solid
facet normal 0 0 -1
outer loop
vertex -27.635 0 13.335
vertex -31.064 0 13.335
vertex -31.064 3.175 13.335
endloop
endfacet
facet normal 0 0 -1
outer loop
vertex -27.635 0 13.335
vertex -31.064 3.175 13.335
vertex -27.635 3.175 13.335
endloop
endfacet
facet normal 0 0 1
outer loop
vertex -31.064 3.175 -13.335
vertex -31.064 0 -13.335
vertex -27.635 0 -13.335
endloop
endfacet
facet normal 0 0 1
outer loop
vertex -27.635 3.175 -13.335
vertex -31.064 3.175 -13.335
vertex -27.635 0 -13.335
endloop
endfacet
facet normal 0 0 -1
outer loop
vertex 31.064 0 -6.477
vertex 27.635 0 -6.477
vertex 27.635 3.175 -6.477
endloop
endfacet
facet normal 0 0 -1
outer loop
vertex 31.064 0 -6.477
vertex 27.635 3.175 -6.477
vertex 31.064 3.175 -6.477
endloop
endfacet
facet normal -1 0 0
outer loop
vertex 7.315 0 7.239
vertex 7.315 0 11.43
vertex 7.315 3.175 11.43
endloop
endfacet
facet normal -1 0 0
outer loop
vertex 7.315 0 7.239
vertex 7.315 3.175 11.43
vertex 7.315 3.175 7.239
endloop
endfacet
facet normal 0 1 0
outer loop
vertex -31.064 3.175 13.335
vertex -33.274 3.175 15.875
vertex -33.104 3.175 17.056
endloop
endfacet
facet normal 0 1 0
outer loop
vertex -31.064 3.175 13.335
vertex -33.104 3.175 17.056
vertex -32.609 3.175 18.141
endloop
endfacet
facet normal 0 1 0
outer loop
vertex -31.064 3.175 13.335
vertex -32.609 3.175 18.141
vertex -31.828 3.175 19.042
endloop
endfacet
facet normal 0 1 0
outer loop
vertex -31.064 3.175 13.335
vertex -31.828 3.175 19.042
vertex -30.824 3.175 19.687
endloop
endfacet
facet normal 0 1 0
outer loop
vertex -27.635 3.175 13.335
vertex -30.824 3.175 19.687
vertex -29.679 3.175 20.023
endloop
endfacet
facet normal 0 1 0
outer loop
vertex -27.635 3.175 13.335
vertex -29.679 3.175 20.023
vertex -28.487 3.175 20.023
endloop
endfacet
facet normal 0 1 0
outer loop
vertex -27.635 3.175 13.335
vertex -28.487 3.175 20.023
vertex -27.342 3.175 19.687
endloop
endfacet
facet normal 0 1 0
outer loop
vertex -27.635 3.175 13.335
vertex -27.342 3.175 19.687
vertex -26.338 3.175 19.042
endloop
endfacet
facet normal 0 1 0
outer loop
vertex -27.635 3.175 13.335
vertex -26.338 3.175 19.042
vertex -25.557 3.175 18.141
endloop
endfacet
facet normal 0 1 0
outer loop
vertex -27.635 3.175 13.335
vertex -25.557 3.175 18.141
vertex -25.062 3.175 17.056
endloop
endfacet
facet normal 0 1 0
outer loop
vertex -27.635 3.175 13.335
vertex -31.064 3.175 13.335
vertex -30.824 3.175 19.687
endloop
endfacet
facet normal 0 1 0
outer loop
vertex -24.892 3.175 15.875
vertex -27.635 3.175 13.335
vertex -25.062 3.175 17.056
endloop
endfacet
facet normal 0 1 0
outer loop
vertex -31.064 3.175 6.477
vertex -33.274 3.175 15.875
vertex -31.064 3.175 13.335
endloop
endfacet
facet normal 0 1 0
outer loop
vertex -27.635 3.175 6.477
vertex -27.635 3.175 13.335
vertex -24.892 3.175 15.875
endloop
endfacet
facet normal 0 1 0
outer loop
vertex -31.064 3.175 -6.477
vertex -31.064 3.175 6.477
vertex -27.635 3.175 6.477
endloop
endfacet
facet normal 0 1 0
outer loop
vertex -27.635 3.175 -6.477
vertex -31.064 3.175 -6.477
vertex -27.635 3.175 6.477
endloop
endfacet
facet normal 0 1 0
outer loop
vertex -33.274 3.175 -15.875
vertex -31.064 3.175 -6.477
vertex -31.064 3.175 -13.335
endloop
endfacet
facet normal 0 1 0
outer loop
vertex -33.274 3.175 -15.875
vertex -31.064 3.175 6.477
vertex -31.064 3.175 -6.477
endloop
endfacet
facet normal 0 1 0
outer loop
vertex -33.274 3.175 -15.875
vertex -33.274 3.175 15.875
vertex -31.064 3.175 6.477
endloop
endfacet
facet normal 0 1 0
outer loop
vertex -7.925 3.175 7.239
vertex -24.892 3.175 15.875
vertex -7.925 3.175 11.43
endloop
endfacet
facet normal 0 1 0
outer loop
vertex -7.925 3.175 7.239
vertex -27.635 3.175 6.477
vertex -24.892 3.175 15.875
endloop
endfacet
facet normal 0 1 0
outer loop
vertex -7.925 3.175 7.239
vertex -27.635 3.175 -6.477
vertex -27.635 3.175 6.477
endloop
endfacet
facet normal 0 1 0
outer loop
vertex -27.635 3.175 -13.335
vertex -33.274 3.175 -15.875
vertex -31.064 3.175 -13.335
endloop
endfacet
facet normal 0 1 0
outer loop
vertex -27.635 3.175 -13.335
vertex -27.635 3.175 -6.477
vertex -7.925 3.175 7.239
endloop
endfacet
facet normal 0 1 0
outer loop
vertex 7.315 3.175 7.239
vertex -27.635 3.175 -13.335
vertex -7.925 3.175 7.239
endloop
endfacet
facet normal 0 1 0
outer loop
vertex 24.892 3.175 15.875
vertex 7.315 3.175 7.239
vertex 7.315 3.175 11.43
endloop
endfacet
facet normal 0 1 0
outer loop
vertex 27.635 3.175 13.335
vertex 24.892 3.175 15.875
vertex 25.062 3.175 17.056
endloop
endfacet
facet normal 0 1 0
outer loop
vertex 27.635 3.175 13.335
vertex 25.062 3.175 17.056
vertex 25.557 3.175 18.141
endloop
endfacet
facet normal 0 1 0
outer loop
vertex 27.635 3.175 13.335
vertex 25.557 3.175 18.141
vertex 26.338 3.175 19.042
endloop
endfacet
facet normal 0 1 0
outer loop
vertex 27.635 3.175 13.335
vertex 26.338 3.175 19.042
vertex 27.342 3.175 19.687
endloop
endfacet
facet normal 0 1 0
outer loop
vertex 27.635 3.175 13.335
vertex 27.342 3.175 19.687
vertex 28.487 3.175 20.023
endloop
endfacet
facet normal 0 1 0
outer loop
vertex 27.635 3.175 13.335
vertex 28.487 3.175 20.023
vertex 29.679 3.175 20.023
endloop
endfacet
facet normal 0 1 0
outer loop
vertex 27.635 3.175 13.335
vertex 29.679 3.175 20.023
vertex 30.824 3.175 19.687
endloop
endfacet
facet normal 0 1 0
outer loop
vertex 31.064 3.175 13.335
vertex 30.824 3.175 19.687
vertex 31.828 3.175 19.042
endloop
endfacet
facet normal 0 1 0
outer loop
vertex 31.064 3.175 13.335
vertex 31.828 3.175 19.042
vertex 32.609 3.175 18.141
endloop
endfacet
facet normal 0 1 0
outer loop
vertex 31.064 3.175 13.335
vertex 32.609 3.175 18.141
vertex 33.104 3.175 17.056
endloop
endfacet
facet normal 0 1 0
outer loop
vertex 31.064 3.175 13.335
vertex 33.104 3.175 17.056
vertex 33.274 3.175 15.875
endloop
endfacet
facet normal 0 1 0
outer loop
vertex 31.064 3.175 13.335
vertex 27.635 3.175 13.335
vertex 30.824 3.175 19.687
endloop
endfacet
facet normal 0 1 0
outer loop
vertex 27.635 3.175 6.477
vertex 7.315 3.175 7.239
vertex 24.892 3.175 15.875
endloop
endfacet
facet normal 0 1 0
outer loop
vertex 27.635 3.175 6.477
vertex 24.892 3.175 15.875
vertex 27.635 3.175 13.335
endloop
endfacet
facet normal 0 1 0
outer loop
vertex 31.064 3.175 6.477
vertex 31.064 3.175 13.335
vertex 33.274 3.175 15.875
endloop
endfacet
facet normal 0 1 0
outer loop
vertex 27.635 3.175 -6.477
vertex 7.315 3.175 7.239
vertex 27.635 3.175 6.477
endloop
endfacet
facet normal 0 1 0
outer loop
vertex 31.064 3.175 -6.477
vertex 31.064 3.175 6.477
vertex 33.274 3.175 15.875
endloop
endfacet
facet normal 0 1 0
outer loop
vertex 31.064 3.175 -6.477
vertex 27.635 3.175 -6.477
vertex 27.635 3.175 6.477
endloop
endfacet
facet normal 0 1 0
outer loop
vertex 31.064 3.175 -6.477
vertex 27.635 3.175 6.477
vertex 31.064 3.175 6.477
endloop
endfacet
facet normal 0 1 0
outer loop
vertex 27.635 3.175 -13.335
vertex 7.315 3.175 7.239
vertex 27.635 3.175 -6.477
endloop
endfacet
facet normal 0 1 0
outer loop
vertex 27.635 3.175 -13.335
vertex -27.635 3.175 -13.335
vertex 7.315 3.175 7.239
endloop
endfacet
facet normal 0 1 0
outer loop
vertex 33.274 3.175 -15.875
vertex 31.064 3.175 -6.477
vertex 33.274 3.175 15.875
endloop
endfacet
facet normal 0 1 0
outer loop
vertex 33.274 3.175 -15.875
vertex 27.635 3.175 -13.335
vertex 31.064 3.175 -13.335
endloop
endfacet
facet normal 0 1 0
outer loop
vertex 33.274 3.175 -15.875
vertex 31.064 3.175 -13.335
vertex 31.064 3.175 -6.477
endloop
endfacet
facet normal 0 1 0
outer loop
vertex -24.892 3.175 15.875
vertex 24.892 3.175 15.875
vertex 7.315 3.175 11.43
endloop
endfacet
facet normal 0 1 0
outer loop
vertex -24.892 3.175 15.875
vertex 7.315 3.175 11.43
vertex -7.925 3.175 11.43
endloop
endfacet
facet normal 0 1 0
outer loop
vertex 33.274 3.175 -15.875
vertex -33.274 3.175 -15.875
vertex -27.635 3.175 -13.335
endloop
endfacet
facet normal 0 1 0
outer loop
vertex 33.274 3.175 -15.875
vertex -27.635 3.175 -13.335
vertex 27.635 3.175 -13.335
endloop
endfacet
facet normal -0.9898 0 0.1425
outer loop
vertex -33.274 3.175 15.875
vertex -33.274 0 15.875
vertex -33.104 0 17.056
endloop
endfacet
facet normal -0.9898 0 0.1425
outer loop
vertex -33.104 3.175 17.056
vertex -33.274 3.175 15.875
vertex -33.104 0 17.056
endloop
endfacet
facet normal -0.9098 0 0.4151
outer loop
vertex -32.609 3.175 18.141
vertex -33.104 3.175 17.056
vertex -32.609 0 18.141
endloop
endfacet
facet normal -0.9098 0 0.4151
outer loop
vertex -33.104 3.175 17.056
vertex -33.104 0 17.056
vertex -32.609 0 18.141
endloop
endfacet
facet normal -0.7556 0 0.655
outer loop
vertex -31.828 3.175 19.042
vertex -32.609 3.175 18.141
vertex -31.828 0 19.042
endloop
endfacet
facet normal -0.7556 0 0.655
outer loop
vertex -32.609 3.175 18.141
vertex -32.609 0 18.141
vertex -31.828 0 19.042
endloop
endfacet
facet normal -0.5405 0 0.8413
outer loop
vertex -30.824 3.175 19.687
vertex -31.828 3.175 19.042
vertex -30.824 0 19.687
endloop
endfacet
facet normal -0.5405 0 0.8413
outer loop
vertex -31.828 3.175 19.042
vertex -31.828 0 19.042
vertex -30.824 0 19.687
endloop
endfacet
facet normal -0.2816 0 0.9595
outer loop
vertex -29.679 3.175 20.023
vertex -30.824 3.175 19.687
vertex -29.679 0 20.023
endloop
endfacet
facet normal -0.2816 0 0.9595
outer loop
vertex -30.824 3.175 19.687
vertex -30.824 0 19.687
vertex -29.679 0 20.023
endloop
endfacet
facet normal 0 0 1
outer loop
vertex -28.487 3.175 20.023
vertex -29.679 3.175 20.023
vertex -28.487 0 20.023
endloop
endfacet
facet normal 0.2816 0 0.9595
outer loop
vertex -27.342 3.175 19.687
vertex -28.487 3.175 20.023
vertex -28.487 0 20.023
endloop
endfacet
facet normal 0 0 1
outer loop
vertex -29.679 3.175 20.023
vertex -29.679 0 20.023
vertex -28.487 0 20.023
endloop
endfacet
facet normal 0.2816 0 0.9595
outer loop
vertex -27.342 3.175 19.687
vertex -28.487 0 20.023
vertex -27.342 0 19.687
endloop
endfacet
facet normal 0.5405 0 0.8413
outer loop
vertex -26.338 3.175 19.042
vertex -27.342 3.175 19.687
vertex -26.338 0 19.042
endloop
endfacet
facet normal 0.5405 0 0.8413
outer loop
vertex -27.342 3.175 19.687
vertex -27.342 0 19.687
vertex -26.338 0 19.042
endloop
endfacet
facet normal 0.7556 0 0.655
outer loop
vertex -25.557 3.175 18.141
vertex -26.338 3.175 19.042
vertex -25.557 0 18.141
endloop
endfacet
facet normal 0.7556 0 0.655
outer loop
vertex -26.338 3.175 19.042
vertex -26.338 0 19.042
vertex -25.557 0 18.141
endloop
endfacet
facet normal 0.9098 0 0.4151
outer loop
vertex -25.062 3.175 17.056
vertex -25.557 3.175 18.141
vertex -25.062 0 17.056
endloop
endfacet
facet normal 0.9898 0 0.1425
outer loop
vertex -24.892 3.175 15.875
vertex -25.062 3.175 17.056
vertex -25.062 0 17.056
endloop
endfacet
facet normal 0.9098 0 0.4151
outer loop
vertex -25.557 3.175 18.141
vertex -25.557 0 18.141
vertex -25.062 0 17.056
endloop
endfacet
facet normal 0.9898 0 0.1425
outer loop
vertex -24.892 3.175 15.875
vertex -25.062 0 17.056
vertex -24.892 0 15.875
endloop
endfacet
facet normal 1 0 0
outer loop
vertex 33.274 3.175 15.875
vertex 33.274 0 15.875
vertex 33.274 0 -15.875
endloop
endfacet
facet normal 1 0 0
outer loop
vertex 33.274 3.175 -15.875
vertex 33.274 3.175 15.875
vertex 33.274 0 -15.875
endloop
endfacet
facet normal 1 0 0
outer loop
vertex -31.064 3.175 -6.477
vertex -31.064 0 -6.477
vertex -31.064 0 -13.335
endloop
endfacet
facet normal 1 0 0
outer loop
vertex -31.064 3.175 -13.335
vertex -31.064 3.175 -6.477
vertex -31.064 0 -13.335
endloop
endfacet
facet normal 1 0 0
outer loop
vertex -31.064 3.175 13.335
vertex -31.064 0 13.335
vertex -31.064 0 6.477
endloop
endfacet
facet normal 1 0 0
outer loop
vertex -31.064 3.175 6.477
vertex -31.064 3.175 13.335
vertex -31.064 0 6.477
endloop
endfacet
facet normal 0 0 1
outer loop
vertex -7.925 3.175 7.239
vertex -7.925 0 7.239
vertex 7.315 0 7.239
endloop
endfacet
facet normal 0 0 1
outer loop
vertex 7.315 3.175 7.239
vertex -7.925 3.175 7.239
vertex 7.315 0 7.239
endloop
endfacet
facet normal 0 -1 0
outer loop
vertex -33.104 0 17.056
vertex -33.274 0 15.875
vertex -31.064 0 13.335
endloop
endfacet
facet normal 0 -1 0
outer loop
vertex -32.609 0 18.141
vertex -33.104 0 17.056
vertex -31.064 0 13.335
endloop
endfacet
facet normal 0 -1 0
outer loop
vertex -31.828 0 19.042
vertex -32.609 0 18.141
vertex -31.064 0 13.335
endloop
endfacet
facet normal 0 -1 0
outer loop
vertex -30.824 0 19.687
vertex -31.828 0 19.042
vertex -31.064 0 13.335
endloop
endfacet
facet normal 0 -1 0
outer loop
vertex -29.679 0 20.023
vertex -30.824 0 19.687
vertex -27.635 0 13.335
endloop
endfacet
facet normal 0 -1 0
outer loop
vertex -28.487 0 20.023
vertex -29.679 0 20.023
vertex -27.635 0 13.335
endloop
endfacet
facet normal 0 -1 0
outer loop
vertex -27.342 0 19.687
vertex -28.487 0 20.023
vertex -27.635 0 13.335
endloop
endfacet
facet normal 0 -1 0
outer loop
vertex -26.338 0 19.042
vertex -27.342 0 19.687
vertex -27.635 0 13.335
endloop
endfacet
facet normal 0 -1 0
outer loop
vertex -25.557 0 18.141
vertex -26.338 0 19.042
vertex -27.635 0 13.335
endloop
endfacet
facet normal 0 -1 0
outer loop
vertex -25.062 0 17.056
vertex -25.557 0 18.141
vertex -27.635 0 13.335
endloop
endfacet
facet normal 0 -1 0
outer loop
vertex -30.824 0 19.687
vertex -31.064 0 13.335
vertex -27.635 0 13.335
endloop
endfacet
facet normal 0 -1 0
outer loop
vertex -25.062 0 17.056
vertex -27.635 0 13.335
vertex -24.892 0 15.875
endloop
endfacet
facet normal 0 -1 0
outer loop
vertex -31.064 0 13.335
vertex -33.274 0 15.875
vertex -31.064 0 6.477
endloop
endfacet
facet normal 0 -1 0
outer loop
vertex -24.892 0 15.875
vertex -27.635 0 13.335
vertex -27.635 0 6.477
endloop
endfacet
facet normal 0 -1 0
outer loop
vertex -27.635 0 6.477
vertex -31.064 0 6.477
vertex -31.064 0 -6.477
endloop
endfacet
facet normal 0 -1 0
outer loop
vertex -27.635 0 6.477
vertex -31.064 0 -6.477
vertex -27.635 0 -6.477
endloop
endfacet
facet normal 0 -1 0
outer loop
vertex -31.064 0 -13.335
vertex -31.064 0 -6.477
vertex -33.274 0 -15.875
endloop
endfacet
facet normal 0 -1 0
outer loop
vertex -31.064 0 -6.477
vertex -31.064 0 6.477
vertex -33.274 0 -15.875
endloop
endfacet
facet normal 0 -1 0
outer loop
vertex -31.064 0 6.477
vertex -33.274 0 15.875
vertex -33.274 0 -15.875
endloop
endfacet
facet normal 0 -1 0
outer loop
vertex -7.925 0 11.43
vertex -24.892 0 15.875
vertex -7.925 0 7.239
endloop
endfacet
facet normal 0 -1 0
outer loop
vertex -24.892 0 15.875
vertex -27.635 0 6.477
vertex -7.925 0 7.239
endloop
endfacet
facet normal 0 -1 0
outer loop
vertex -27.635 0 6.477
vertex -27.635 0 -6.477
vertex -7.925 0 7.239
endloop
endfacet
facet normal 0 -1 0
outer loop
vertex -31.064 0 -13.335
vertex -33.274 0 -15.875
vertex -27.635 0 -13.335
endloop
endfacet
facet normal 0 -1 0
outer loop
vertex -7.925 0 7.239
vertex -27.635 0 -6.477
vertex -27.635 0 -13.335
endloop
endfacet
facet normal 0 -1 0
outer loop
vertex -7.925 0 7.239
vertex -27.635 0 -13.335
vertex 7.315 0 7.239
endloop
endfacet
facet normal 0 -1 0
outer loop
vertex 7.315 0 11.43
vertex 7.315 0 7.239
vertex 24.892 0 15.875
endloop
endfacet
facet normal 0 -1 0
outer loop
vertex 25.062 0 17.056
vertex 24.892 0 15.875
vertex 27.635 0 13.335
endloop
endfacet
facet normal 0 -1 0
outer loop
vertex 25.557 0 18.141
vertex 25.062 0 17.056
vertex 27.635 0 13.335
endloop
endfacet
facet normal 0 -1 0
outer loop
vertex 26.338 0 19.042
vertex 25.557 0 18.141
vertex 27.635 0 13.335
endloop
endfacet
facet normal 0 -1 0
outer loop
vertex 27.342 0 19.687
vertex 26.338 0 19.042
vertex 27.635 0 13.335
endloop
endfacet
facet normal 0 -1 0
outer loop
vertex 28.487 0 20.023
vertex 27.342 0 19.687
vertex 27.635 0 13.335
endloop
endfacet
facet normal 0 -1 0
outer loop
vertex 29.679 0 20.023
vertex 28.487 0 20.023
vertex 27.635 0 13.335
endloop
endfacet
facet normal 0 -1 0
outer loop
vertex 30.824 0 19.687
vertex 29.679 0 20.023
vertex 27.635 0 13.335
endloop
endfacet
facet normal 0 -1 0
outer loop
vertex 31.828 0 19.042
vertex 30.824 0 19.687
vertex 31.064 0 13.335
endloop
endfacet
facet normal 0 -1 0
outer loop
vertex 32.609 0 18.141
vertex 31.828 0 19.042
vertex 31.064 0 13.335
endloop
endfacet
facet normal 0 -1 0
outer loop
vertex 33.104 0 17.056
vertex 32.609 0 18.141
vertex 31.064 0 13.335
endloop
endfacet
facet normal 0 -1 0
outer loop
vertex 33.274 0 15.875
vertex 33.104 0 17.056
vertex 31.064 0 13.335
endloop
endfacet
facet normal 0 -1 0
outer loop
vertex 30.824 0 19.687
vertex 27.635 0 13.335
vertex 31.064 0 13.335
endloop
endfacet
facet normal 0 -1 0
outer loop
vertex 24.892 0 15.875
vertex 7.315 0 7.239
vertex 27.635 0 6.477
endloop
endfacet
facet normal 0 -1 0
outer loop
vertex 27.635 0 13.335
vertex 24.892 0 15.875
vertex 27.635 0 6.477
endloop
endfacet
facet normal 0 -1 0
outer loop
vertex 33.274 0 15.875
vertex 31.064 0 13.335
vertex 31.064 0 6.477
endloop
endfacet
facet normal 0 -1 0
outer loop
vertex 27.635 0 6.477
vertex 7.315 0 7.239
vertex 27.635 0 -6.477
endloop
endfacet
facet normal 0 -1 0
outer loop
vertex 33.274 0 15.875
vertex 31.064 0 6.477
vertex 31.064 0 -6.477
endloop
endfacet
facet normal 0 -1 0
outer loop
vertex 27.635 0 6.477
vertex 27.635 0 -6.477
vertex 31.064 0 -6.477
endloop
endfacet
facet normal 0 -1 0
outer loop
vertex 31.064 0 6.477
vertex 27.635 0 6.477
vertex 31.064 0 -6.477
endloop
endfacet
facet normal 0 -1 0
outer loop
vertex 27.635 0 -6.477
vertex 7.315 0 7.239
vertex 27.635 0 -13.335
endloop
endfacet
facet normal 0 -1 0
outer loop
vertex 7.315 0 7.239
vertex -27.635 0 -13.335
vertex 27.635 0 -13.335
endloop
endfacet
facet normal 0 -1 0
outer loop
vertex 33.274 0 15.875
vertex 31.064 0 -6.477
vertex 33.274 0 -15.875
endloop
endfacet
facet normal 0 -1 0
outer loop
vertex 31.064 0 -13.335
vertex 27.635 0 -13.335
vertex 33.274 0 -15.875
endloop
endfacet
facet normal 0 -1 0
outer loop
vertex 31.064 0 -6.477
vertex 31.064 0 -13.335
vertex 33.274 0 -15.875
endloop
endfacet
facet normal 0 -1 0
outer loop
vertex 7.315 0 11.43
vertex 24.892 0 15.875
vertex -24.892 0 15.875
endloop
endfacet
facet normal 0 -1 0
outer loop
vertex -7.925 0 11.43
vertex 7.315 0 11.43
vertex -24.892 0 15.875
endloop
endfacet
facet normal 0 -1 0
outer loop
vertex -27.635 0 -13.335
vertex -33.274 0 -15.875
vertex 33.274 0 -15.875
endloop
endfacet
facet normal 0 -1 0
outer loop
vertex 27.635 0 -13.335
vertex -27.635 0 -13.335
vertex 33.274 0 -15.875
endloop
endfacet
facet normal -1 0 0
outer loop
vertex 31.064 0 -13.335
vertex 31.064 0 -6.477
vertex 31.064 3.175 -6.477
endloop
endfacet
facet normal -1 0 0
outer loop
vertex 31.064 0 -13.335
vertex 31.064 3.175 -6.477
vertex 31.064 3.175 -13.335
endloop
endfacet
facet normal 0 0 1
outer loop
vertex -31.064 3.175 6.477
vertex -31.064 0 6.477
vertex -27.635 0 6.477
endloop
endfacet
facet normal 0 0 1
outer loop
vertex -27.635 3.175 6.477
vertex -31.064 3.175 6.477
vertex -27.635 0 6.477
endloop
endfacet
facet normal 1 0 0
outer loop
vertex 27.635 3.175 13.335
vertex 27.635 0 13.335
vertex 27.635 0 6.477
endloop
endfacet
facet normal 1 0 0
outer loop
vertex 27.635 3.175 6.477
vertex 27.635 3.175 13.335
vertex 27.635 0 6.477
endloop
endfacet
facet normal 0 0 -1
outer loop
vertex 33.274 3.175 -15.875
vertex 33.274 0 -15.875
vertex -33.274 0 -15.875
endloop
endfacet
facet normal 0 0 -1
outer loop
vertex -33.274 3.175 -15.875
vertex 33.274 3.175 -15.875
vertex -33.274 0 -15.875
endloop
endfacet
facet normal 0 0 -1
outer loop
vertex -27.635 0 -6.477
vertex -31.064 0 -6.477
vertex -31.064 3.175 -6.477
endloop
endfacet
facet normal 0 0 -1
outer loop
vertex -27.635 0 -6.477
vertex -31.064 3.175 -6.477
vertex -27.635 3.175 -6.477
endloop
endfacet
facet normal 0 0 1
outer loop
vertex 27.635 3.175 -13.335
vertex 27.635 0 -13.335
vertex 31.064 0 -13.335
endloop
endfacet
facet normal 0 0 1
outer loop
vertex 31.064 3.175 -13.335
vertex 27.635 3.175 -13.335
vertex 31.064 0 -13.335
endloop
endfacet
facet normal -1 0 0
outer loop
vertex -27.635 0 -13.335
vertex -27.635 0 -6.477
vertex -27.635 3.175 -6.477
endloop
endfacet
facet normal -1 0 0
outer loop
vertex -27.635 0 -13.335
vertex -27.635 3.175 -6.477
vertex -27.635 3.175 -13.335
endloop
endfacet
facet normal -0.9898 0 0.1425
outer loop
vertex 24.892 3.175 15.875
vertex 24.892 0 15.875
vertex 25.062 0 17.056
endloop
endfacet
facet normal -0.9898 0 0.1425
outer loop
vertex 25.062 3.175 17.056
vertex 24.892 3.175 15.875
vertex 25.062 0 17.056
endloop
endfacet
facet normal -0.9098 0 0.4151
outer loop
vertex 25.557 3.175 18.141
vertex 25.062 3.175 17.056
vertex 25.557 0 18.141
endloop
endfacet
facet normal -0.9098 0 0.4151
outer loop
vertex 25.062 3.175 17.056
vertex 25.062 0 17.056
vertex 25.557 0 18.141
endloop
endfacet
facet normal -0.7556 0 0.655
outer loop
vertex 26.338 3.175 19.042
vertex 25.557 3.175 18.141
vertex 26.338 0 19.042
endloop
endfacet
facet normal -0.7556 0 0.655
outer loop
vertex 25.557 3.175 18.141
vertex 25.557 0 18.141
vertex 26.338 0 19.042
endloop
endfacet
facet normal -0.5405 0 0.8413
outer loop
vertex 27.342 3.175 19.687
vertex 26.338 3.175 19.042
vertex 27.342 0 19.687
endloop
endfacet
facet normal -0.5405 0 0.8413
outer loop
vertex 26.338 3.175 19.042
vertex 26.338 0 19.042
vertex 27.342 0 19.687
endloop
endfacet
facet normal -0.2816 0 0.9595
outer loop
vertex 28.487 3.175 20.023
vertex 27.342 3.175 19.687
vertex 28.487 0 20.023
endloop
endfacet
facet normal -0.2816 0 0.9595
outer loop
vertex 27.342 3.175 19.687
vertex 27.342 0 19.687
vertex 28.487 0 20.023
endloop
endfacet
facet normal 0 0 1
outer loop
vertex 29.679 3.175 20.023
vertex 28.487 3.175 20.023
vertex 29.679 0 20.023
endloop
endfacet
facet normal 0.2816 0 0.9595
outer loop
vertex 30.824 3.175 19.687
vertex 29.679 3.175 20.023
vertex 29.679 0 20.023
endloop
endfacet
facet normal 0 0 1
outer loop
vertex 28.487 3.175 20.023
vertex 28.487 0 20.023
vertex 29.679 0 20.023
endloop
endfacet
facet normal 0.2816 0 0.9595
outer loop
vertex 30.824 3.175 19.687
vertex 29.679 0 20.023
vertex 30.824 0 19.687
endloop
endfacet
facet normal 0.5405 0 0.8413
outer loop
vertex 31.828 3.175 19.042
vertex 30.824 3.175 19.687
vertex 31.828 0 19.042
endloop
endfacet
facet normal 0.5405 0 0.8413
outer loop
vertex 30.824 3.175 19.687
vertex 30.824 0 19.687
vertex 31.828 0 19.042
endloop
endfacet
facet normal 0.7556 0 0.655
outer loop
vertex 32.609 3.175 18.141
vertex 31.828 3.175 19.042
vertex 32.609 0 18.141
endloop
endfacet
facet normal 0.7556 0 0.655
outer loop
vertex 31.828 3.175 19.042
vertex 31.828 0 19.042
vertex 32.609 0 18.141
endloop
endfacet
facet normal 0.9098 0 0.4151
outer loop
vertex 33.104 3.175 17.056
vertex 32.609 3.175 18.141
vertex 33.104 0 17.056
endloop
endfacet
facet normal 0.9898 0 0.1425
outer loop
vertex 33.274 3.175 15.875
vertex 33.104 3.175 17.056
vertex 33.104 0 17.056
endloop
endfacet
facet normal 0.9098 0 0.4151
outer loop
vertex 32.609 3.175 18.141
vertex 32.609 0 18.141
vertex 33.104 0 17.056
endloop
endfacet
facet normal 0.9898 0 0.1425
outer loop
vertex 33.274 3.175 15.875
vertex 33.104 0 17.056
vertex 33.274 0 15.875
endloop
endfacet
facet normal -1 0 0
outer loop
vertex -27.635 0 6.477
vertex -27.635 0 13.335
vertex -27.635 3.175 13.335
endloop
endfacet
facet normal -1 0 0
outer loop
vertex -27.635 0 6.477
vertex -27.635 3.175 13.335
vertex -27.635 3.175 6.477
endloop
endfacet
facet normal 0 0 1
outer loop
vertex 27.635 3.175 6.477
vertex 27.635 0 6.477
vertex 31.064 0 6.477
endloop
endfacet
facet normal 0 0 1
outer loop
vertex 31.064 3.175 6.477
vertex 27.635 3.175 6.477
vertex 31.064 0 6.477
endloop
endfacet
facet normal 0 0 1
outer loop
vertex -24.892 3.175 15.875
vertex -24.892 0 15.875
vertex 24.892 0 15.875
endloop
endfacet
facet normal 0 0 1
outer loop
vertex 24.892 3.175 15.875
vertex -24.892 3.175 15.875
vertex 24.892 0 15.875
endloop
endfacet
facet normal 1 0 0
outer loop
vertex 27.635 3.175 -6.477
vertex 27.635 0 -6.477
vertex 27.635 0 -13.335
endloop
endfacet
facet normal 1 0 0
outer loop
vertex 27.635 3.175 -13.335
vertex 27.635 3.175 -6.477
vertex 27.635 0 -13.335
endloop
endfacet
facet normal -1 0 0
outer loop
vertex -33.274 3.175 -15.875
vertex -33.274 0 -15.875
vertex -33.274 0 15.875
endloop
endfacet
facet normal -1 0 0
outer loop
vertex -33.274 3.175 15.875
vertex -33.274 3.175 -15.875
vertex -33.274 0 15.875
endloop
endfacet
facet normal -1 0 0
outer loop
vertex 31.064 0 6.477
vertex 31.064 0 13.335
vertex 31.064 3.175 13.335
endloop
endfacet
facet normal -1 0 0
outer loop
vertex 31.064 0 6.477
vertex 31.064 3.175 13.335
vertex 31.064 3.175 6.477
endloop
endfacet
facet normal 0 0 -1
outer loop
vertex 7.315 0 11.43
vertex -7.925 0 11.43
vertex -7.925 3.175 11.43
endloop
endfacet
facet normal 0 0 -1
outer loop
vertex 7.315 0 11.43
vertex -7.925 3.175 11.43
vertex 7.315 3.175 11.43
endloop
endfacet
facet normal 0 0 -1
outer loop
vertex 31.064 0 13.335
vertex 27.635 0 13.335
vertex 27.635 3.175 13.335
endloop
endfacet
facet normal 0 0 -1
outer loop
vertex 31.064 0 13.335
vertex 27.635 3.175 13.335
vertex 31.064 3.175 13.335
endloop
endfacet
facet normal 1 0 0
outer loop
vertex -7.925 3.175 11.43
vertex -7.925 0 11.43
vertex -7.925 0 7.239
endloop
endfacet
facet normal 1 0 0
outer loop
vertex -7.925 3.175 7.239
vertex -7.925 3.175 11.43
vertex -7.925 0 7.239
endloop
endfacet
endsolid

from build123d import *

# Parameters (mm, degrees)
SKETCH1_W           = 3.429
SKETCH1_H           = 6.858
SKETCH1_W_2         = 15.24
SKETCH1_H_2         = 4.191
BOSS_EXTRUDE1_DEPTH = 3.175


with BuildPart() as part:
    # Sketch1 → Boss-Extrude1 (new body)
    with BuildSketch(Plane(origin=(0, 0, 0), x_dir=(1, 0, 0), z_dir=(0, 1, 0))):
        with BuildLine():
            Line((-24.892, -15.875), (24.892, -15.875))
            ThreePointArc((24.892, -15.875), (29.083, -20.066), (33.274, -15.875))
            Line((33.274, -15.875), (33.274, 15.875))
            Line((33.274, 15.875), (-33.274, 15.875))
            Line((-33.274, 15.875), (-33.274, -15.875))
            ThreePointArc((-33.274, -15.875), (-29.083, -20.066), (-24.892, -15.875))
        make_face()
        with Locations((29.3497, 9.906)):
            Rectangle(SKETCH1_W, SKETCH1_H, mode=Mode.SUBTRACT)
        with Locations((29.3497, -9.906)):
            Rectangle(SKETCH1_W, SKETCH1_H, mode=Mode.SUBTRACT)
        with Locations((-29.3497, -9.906)):
            Rectangle(SKETCH1_W, SKETCH1_H, mode=Mode.SUBTRACT)
        with Locations((-29.3497, 9.906)):
            Rectangle(SKETCH1_W, SKETCH1_H, mode=Mode.SUBTRACT)
        with Locations((-0.3048, -9.3345)):
            Rectangle(SKETCH1_W_2, SKETCH1_H_2, mode=Mode.SUBTRACT)
    extrude(amount=BOSS_EXTRUDE1_DEPTH)


solid = part.part
